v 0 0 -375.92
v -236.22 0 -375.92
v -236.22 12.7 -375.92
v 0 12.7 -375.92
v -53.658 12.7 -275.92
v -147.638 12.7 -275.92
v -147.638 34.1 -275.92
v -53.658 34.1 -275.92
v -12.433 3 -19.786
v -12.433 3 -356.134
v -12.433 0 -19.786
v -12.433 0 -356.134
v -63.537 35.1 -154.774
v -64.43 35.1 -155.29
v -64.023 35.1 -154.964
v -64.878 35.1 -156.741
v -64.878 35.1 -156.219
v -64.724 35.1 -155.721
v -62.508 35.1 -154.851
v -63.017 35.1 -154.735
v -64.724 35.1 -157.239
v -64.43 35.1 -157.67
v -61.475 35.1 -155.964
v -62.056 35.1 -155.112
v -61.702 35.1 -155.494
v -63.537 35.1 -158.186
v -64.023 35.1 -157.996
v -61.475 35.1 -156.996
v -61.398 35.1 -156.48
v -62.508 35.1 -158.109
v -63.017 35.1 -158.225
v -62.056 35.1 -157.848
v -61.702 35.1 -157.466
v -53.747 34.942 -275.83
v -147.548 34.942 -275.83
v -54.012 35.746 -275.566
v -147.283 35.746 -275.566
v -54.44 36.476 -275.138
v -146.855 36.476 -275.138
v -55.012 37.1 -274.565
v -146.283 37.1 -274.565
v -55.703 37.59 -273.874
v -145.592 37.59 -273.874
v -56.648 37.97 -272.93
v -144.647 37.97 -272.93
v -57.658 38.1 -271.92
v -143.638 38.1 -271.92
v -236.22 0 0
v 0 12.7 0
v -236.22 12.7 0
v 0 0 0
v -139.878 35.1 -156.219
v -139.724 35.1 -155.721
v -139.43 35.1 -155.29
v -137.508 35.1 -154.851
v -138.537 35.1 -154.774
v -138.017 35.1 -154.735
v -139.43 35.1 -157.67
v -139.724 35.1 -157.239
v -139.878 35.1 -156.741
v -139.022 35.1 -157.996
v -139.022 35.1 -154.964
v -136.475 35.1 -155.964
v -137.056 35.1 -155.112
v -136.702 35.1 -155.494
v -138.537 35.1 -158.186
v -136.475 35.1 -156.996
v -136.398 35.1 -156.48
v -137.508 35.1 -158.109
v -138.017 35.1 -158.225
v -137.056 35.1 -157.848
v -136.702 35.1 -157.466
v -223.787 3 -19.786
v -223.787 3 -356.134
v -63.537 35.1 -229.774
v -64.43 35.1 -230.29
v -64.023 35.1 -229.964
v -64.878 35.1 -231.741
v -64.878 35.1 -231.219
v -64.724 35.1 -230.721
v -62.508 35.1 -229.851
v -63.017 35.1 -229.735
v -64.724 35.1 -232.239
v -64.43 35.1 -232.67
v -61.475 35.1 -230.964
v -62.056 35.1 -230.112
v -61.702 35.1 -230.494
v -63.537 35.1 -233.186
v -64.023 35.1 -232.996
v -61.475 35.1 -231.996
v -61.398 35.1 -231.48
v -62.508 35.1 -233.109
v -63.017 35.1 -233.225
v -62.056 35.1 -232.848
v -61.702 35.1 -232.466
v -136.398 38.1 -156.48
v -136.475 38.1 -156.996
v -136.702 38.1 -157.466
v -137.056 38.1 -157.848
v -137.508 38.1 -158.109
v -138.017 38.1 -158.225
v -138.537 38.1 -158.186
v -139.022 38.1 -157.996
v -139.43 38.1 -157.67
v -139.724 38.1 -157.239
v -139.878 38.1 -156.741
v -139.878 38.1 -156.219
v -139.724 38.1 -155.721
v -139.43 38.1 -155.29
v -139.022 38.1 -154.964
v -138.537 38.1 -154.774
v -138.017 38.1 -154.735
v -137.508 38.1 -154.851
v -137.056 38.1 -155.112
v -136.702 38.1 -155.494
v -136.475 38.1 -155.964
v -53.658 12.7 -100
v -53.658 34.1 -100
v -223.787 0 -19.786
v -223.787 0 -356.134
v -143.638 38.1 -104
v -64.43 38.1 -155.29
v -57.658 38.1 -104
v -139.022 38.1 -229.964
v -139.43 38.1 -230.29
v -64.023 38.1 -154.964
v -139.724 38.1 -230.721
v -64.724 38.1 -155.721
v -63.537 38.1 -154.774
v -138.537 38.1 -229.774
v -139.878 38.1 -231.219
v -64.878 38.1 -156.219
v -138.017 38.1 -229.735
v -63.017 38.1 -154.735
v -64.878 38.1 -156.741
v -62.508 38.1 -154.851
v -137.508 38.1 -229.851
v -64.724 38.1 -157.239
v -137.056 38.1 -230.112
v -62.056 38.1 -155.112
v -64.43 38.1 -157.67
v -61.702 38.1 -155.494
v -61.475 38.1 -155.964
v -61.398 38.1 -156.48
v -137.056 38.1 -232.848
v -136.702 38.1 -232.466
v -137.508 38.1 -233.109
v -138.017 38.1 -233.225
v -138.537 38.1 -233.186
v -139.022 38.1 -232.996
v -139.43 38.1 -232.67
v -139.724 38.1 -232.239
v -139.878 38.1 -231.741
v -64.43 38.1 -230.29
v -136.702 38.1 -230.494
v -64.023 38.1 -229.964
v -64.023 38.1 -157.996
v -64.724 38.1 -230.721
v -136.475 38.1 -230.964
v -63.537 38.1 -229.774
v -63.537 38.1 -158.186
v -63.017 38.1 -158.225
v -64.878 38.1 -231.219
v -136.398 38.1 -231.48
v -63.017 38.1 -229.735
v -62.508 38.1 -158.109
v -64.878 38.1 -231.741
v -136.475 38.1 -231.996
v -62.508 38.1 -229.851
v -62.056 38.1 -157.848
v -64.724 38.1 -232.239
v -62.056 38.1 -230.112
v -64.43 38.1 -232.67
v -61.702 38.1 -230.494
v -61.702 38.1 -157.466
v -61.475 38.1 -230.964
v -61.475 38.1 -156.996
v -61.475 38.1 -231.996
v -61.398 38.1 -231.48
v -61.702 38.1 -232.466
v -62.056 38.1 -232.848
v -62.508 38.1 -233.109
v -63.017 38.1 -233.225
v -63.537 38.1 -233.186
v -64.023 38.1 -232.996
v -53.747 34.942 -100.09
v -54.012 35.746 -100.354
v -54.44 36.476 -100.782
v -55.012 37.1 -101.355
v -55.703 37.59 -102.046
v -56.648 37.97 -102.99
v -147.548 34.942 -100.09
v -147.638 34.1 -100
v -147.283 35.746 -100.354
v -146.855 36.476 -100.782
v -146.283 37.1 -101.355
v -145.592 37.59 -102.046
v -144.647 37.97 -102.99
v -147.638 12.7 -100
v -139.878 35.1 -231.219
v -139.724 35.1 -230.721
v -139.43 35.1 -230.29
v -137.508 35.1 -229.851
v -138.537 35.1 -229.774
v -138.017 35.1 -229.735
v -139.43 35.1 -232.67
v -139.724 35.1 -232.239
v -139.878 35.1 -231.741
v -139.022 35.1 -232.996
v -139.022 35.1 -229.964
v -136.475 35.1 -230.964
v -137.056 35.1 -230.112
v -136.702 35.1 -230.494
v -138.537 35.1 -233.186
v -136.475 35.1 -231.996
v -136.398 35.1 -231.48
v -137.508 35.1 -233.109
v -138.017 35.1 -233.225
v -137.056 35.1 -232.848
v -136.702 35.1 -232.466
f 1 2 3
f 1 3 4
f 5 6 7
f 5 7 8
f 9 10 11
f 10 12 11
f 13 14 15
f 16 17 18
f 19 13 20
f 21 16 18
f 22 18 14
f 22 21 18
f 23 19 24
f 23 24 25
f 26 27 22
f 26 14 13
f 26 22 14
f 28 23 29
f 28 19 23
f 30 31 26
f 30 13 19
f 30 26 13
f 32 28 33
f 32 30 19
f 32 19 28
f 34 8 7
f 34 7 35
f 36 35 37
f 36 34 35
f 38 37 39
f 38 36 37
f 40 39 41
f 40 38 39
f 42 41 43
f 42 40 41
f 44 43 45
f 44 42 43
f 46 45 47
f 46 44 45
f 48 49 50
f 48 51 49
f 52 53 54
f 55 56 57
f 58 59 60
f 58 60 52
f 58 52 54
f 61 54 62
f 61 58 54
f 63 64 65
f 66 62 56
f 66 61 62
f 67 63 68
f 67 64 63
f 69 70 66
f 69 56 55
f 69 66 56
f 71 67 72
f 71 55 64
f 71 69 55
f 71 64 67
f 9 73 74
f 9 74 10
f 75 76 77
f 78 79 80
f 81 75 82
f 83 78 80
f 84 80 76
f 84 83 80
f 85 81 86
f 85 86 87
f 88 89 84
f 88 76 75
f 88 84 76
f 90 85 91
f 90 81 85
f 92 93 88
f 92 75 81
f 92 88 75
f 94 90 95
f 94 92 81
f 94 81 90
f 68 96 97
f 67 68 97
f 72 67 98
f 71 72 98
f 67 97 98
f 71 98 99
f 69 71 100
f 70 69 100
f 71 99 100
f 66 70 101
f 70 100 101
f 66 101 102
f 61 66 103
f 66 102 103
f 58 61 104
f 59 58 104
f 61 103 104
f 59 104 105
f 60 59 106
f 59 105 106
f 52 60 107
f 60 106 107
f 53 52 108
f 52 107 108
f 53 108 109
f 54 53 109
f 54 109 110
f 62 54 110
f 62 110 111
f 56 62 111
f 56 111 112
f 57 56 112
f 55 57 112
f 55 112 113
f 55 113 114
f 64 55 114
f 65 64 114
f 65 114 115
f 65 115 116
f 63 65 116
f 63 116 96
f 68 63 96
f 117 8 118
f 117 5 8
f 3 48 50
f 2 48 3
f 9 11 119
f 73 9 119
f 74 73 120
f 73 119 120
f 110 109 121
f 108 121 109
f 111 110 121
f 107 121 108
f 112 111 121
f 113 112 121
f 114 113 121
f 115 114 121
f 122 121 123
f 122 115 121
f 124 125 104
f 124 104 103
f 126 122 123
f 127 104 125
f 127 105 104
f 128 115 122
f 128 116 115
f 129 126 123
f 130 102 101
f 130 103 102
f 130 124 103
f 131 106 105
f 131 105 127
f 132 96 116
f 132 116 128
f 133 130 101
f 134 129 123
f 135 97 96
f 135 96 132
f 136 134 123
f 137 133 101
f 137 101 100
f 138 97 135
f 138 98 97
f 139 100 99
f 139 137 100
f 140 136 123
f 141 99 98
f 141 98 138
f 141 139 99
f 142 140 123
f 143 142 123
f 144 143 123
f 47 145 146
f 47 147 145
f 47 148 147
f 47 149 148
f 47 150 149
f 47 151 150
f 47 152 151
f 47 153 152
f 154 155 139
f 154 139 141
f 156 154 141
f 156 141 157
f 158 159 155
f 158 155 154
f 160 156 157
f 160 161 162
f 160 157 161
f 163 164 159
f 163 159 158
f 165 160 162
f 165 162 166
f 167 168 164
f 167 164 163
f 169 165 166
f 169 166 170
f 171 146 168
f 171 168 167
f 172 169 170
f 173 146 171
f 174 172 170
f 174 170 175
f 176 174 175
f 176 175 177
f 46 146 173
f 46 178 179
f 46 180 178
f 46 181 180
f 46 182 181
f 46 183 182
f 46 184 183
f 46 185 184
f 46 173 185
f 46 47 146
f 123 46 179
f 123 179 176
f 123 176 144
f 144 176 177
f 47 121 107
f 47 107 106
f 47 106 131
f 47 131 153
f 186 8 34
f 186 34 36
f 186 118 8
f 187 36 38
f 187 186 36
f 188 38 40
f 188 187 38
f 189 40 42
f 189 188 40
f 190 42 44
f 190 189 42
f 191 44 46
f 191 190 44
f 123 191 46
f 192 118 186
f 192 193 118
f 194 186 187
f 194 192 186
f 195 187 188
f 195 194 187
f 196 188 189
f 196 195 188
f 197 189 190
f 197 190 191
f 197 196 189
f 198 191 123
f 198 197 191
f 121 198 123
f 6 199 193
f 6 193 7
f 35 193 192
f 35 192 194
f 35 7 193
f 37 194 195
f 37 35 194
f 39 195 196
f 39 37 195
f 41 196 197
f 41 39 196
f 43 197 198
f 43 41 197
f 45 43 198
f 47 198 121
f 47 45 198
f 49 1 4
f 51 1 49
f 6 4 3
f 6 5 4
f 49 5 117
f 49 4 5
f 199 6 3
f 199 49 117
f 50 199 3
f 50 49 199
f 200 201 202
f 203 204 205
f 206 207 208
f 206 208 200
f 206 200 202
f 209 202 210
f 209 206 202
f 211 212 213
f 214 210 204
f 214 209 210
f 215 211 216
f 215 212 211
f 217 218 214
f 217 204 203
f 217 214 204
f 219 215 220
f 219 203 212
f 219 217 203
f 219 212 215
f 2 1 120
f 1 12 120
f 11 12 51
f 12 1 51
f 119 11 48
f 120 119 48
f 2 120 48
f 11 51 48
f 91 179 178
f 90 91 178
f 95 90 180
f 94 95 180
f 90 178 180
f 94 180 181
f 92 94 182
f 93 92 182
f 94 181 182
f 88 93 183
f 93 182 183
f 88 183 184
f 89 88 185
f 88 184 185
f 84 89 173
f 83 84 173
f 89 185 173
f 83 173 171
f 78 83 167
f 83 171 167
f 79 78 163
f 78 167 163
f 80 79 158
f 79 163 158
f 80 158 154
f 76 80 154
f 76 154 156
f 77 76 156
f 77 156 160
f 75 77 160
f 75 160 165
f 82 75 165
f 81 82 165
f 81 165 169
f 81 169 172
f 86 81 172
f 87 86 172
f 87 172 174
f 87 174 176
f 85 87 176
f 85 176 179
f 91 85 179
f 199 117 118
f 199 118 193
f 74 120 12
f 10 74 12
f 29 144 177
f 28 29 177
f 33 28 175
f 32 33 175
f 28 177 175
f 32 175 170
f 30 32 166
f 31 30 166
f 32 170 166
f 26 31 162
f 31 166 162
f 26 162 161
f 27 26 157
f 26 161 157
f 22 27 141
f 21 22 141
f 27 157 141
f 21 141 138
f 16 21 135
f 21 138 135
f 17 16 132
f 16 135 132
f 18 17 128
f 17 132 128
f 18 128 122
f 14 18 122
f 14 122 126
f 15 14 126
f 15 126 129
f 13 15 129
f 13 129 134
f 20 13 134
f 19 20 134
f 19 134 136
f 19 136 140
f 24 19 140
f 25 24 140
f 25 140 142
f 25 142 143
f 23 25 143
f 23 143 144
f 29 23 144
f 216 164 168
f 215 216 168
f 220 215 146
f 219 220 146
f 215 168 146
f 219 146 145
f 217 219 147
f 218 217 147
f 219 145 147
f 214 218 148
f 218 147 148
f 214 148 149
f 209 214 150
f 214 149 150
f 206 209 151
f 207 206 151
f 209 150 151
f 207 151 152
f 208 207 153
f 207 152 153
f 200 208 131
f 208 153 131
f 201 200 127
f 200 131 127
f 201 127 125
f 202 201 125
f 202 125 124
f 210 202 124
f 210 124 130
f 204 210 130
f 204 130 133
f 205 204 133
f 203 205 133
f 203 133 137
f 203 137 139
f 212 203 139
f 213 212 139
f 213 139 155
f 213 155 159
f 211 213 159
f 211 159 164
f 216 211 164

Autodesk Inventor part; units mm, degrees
ref_plane "YZ Plane" through (0, 0, 0) normal (1, 0, 0) x (0, 1, 0)
ref_plane "XZ Plane" through (0, 0, 0) normal (0, 1, 0) x (-1, 0, 0)
ref_plane "XY Plane" through (0, 0, 0) normal (0, 0, 1) x (1, 0, 0)
sketch "Sketch1" plane through (0, 0, 0) normal (0, 1, 0) x (-1, 0, 0)
  line L0 (0, 0) -> (236.22, 0)
  line L1 (236.22, 0) -> (236.22, -375.92)
  line L2 (236.22, -375.92) -> (0, -375.92)
  line L3 (0, -375.92) -> (0, 0)
  dimension "d0" = 236.22
  dimension "d1" = 375.92
extrude "Extrusion1" add sketch "Sketch1" along normal blind 12.7
sketch "Sketch2" plane through (0, 12.7, 0) normal (0, 1, 0) x (1, 0, 0)
  line L0 (-236.22, 375.92) -> (-236.22, 0) projected
  line L1 (-236.22, 187.96) -> (-147.6375, 187.96)
  line L2 (0, 375.92) -> (-236.22, 375.92) projected
  line L3 (-147.6375, 375.92) -> (-147.6375, 275.92)
  line L4 (-236.22, 0) -> (0, 0) projected
  line L5 (-147.6375, 0) -> (-147.6375, 100)
  line L6 (-147.6375, 0) -> (-47.6375, 0) construction
  line L7 (-147.6375, 275.92) -> (-53.6575, 275.92)
  line L8 (-53.6575, 275.92) -> (-53.6575, 100)
  line L9 (-53.6575, 100) -> (-147.6375, 100)
  line L10 (-147.6375, 100) -> (-147.6375, 275.92)
  dimension "d4" = 88.5825
  dimension "d5" = 100
  dimension "d6" = 88.5825
  dimension "d7" = 100
  dimension "d8" = 90
  dimension "d9" = 88.5825
  dimension "d10" = 93.98
  dimension "d11" = 175.92
extrude "Extrusion2" add sketch "Sketch2" along normal blind 25.4 contours L10 L7 L8 L9
fillet "Fillet1" radius 4 4 edges at (-147.6375, 38.1, -187.96) (-53.6575, 38.1, -187.96) (-100.6475, 38.1, -100) (-100.6475, 38.1, -275.92)
sketch "Sketch3" plane through (0, 0, 0) normal (0, -1, 0) x (1, 0, 0)
  line L0 (0, -375.92) -> (0, 0) projected
  line L1 (-236.22, 0) -> (-236.22, -375.92) projected
  line L2 (0, 0) -> (-236.22, -375.92)
  line L3 (-236.22, -375.92) -> (-223.787, -356.1341)
  line L4 (0, 0) -> (-12.433, -19.7859)
  line L5 (-223.787, -356.1341) -> (-12.433, -356.1341)
  line L6 (-12.433, -356.1341) -> (-12.433, -19.7859)
  line L7 (-12.433, -19.7859) -> (-223.787, -19.7859)
  line L8 (-223.787, -19.7859) -> (-223.787, -356.1341)
  dimension "d15" = 23.368
  dimension "d16" = 23.368
extrude "Extrusion3" cut sketch "Sketch3" against normal blind 3
sketch "Sketch4" plane through (0, 38.1, 0) normal (0, 1, 0) x (1, 0, 0)
  circle A0 centre (-138.1475, 231.48) radius 1.75
  line L0 (-57.6575, 104) -> (-143.6375, 104) projected
  line L1 (-57.6575, 271.92) -> (-57.6575, 104) projected
  circle A1 centre (-63.1475, 231.48) radius 1.75
  circle A2 centre (-138.1475, 156.48) radius 1.75
  circle A3 centre (-63.1475, 156.48) radius 1.75
  point P0 (0, 0)
  dimension "d19" = 3.5
  dimension "d20" = 127.48
  dimension "d21" = 80.49
  dimension "d24" = 75
  dimension "d27" = 75
extrude "Extrusion4" cut sketch "Sketch4" against normal blind 3
properties part number "SpectreE165W_16in"
